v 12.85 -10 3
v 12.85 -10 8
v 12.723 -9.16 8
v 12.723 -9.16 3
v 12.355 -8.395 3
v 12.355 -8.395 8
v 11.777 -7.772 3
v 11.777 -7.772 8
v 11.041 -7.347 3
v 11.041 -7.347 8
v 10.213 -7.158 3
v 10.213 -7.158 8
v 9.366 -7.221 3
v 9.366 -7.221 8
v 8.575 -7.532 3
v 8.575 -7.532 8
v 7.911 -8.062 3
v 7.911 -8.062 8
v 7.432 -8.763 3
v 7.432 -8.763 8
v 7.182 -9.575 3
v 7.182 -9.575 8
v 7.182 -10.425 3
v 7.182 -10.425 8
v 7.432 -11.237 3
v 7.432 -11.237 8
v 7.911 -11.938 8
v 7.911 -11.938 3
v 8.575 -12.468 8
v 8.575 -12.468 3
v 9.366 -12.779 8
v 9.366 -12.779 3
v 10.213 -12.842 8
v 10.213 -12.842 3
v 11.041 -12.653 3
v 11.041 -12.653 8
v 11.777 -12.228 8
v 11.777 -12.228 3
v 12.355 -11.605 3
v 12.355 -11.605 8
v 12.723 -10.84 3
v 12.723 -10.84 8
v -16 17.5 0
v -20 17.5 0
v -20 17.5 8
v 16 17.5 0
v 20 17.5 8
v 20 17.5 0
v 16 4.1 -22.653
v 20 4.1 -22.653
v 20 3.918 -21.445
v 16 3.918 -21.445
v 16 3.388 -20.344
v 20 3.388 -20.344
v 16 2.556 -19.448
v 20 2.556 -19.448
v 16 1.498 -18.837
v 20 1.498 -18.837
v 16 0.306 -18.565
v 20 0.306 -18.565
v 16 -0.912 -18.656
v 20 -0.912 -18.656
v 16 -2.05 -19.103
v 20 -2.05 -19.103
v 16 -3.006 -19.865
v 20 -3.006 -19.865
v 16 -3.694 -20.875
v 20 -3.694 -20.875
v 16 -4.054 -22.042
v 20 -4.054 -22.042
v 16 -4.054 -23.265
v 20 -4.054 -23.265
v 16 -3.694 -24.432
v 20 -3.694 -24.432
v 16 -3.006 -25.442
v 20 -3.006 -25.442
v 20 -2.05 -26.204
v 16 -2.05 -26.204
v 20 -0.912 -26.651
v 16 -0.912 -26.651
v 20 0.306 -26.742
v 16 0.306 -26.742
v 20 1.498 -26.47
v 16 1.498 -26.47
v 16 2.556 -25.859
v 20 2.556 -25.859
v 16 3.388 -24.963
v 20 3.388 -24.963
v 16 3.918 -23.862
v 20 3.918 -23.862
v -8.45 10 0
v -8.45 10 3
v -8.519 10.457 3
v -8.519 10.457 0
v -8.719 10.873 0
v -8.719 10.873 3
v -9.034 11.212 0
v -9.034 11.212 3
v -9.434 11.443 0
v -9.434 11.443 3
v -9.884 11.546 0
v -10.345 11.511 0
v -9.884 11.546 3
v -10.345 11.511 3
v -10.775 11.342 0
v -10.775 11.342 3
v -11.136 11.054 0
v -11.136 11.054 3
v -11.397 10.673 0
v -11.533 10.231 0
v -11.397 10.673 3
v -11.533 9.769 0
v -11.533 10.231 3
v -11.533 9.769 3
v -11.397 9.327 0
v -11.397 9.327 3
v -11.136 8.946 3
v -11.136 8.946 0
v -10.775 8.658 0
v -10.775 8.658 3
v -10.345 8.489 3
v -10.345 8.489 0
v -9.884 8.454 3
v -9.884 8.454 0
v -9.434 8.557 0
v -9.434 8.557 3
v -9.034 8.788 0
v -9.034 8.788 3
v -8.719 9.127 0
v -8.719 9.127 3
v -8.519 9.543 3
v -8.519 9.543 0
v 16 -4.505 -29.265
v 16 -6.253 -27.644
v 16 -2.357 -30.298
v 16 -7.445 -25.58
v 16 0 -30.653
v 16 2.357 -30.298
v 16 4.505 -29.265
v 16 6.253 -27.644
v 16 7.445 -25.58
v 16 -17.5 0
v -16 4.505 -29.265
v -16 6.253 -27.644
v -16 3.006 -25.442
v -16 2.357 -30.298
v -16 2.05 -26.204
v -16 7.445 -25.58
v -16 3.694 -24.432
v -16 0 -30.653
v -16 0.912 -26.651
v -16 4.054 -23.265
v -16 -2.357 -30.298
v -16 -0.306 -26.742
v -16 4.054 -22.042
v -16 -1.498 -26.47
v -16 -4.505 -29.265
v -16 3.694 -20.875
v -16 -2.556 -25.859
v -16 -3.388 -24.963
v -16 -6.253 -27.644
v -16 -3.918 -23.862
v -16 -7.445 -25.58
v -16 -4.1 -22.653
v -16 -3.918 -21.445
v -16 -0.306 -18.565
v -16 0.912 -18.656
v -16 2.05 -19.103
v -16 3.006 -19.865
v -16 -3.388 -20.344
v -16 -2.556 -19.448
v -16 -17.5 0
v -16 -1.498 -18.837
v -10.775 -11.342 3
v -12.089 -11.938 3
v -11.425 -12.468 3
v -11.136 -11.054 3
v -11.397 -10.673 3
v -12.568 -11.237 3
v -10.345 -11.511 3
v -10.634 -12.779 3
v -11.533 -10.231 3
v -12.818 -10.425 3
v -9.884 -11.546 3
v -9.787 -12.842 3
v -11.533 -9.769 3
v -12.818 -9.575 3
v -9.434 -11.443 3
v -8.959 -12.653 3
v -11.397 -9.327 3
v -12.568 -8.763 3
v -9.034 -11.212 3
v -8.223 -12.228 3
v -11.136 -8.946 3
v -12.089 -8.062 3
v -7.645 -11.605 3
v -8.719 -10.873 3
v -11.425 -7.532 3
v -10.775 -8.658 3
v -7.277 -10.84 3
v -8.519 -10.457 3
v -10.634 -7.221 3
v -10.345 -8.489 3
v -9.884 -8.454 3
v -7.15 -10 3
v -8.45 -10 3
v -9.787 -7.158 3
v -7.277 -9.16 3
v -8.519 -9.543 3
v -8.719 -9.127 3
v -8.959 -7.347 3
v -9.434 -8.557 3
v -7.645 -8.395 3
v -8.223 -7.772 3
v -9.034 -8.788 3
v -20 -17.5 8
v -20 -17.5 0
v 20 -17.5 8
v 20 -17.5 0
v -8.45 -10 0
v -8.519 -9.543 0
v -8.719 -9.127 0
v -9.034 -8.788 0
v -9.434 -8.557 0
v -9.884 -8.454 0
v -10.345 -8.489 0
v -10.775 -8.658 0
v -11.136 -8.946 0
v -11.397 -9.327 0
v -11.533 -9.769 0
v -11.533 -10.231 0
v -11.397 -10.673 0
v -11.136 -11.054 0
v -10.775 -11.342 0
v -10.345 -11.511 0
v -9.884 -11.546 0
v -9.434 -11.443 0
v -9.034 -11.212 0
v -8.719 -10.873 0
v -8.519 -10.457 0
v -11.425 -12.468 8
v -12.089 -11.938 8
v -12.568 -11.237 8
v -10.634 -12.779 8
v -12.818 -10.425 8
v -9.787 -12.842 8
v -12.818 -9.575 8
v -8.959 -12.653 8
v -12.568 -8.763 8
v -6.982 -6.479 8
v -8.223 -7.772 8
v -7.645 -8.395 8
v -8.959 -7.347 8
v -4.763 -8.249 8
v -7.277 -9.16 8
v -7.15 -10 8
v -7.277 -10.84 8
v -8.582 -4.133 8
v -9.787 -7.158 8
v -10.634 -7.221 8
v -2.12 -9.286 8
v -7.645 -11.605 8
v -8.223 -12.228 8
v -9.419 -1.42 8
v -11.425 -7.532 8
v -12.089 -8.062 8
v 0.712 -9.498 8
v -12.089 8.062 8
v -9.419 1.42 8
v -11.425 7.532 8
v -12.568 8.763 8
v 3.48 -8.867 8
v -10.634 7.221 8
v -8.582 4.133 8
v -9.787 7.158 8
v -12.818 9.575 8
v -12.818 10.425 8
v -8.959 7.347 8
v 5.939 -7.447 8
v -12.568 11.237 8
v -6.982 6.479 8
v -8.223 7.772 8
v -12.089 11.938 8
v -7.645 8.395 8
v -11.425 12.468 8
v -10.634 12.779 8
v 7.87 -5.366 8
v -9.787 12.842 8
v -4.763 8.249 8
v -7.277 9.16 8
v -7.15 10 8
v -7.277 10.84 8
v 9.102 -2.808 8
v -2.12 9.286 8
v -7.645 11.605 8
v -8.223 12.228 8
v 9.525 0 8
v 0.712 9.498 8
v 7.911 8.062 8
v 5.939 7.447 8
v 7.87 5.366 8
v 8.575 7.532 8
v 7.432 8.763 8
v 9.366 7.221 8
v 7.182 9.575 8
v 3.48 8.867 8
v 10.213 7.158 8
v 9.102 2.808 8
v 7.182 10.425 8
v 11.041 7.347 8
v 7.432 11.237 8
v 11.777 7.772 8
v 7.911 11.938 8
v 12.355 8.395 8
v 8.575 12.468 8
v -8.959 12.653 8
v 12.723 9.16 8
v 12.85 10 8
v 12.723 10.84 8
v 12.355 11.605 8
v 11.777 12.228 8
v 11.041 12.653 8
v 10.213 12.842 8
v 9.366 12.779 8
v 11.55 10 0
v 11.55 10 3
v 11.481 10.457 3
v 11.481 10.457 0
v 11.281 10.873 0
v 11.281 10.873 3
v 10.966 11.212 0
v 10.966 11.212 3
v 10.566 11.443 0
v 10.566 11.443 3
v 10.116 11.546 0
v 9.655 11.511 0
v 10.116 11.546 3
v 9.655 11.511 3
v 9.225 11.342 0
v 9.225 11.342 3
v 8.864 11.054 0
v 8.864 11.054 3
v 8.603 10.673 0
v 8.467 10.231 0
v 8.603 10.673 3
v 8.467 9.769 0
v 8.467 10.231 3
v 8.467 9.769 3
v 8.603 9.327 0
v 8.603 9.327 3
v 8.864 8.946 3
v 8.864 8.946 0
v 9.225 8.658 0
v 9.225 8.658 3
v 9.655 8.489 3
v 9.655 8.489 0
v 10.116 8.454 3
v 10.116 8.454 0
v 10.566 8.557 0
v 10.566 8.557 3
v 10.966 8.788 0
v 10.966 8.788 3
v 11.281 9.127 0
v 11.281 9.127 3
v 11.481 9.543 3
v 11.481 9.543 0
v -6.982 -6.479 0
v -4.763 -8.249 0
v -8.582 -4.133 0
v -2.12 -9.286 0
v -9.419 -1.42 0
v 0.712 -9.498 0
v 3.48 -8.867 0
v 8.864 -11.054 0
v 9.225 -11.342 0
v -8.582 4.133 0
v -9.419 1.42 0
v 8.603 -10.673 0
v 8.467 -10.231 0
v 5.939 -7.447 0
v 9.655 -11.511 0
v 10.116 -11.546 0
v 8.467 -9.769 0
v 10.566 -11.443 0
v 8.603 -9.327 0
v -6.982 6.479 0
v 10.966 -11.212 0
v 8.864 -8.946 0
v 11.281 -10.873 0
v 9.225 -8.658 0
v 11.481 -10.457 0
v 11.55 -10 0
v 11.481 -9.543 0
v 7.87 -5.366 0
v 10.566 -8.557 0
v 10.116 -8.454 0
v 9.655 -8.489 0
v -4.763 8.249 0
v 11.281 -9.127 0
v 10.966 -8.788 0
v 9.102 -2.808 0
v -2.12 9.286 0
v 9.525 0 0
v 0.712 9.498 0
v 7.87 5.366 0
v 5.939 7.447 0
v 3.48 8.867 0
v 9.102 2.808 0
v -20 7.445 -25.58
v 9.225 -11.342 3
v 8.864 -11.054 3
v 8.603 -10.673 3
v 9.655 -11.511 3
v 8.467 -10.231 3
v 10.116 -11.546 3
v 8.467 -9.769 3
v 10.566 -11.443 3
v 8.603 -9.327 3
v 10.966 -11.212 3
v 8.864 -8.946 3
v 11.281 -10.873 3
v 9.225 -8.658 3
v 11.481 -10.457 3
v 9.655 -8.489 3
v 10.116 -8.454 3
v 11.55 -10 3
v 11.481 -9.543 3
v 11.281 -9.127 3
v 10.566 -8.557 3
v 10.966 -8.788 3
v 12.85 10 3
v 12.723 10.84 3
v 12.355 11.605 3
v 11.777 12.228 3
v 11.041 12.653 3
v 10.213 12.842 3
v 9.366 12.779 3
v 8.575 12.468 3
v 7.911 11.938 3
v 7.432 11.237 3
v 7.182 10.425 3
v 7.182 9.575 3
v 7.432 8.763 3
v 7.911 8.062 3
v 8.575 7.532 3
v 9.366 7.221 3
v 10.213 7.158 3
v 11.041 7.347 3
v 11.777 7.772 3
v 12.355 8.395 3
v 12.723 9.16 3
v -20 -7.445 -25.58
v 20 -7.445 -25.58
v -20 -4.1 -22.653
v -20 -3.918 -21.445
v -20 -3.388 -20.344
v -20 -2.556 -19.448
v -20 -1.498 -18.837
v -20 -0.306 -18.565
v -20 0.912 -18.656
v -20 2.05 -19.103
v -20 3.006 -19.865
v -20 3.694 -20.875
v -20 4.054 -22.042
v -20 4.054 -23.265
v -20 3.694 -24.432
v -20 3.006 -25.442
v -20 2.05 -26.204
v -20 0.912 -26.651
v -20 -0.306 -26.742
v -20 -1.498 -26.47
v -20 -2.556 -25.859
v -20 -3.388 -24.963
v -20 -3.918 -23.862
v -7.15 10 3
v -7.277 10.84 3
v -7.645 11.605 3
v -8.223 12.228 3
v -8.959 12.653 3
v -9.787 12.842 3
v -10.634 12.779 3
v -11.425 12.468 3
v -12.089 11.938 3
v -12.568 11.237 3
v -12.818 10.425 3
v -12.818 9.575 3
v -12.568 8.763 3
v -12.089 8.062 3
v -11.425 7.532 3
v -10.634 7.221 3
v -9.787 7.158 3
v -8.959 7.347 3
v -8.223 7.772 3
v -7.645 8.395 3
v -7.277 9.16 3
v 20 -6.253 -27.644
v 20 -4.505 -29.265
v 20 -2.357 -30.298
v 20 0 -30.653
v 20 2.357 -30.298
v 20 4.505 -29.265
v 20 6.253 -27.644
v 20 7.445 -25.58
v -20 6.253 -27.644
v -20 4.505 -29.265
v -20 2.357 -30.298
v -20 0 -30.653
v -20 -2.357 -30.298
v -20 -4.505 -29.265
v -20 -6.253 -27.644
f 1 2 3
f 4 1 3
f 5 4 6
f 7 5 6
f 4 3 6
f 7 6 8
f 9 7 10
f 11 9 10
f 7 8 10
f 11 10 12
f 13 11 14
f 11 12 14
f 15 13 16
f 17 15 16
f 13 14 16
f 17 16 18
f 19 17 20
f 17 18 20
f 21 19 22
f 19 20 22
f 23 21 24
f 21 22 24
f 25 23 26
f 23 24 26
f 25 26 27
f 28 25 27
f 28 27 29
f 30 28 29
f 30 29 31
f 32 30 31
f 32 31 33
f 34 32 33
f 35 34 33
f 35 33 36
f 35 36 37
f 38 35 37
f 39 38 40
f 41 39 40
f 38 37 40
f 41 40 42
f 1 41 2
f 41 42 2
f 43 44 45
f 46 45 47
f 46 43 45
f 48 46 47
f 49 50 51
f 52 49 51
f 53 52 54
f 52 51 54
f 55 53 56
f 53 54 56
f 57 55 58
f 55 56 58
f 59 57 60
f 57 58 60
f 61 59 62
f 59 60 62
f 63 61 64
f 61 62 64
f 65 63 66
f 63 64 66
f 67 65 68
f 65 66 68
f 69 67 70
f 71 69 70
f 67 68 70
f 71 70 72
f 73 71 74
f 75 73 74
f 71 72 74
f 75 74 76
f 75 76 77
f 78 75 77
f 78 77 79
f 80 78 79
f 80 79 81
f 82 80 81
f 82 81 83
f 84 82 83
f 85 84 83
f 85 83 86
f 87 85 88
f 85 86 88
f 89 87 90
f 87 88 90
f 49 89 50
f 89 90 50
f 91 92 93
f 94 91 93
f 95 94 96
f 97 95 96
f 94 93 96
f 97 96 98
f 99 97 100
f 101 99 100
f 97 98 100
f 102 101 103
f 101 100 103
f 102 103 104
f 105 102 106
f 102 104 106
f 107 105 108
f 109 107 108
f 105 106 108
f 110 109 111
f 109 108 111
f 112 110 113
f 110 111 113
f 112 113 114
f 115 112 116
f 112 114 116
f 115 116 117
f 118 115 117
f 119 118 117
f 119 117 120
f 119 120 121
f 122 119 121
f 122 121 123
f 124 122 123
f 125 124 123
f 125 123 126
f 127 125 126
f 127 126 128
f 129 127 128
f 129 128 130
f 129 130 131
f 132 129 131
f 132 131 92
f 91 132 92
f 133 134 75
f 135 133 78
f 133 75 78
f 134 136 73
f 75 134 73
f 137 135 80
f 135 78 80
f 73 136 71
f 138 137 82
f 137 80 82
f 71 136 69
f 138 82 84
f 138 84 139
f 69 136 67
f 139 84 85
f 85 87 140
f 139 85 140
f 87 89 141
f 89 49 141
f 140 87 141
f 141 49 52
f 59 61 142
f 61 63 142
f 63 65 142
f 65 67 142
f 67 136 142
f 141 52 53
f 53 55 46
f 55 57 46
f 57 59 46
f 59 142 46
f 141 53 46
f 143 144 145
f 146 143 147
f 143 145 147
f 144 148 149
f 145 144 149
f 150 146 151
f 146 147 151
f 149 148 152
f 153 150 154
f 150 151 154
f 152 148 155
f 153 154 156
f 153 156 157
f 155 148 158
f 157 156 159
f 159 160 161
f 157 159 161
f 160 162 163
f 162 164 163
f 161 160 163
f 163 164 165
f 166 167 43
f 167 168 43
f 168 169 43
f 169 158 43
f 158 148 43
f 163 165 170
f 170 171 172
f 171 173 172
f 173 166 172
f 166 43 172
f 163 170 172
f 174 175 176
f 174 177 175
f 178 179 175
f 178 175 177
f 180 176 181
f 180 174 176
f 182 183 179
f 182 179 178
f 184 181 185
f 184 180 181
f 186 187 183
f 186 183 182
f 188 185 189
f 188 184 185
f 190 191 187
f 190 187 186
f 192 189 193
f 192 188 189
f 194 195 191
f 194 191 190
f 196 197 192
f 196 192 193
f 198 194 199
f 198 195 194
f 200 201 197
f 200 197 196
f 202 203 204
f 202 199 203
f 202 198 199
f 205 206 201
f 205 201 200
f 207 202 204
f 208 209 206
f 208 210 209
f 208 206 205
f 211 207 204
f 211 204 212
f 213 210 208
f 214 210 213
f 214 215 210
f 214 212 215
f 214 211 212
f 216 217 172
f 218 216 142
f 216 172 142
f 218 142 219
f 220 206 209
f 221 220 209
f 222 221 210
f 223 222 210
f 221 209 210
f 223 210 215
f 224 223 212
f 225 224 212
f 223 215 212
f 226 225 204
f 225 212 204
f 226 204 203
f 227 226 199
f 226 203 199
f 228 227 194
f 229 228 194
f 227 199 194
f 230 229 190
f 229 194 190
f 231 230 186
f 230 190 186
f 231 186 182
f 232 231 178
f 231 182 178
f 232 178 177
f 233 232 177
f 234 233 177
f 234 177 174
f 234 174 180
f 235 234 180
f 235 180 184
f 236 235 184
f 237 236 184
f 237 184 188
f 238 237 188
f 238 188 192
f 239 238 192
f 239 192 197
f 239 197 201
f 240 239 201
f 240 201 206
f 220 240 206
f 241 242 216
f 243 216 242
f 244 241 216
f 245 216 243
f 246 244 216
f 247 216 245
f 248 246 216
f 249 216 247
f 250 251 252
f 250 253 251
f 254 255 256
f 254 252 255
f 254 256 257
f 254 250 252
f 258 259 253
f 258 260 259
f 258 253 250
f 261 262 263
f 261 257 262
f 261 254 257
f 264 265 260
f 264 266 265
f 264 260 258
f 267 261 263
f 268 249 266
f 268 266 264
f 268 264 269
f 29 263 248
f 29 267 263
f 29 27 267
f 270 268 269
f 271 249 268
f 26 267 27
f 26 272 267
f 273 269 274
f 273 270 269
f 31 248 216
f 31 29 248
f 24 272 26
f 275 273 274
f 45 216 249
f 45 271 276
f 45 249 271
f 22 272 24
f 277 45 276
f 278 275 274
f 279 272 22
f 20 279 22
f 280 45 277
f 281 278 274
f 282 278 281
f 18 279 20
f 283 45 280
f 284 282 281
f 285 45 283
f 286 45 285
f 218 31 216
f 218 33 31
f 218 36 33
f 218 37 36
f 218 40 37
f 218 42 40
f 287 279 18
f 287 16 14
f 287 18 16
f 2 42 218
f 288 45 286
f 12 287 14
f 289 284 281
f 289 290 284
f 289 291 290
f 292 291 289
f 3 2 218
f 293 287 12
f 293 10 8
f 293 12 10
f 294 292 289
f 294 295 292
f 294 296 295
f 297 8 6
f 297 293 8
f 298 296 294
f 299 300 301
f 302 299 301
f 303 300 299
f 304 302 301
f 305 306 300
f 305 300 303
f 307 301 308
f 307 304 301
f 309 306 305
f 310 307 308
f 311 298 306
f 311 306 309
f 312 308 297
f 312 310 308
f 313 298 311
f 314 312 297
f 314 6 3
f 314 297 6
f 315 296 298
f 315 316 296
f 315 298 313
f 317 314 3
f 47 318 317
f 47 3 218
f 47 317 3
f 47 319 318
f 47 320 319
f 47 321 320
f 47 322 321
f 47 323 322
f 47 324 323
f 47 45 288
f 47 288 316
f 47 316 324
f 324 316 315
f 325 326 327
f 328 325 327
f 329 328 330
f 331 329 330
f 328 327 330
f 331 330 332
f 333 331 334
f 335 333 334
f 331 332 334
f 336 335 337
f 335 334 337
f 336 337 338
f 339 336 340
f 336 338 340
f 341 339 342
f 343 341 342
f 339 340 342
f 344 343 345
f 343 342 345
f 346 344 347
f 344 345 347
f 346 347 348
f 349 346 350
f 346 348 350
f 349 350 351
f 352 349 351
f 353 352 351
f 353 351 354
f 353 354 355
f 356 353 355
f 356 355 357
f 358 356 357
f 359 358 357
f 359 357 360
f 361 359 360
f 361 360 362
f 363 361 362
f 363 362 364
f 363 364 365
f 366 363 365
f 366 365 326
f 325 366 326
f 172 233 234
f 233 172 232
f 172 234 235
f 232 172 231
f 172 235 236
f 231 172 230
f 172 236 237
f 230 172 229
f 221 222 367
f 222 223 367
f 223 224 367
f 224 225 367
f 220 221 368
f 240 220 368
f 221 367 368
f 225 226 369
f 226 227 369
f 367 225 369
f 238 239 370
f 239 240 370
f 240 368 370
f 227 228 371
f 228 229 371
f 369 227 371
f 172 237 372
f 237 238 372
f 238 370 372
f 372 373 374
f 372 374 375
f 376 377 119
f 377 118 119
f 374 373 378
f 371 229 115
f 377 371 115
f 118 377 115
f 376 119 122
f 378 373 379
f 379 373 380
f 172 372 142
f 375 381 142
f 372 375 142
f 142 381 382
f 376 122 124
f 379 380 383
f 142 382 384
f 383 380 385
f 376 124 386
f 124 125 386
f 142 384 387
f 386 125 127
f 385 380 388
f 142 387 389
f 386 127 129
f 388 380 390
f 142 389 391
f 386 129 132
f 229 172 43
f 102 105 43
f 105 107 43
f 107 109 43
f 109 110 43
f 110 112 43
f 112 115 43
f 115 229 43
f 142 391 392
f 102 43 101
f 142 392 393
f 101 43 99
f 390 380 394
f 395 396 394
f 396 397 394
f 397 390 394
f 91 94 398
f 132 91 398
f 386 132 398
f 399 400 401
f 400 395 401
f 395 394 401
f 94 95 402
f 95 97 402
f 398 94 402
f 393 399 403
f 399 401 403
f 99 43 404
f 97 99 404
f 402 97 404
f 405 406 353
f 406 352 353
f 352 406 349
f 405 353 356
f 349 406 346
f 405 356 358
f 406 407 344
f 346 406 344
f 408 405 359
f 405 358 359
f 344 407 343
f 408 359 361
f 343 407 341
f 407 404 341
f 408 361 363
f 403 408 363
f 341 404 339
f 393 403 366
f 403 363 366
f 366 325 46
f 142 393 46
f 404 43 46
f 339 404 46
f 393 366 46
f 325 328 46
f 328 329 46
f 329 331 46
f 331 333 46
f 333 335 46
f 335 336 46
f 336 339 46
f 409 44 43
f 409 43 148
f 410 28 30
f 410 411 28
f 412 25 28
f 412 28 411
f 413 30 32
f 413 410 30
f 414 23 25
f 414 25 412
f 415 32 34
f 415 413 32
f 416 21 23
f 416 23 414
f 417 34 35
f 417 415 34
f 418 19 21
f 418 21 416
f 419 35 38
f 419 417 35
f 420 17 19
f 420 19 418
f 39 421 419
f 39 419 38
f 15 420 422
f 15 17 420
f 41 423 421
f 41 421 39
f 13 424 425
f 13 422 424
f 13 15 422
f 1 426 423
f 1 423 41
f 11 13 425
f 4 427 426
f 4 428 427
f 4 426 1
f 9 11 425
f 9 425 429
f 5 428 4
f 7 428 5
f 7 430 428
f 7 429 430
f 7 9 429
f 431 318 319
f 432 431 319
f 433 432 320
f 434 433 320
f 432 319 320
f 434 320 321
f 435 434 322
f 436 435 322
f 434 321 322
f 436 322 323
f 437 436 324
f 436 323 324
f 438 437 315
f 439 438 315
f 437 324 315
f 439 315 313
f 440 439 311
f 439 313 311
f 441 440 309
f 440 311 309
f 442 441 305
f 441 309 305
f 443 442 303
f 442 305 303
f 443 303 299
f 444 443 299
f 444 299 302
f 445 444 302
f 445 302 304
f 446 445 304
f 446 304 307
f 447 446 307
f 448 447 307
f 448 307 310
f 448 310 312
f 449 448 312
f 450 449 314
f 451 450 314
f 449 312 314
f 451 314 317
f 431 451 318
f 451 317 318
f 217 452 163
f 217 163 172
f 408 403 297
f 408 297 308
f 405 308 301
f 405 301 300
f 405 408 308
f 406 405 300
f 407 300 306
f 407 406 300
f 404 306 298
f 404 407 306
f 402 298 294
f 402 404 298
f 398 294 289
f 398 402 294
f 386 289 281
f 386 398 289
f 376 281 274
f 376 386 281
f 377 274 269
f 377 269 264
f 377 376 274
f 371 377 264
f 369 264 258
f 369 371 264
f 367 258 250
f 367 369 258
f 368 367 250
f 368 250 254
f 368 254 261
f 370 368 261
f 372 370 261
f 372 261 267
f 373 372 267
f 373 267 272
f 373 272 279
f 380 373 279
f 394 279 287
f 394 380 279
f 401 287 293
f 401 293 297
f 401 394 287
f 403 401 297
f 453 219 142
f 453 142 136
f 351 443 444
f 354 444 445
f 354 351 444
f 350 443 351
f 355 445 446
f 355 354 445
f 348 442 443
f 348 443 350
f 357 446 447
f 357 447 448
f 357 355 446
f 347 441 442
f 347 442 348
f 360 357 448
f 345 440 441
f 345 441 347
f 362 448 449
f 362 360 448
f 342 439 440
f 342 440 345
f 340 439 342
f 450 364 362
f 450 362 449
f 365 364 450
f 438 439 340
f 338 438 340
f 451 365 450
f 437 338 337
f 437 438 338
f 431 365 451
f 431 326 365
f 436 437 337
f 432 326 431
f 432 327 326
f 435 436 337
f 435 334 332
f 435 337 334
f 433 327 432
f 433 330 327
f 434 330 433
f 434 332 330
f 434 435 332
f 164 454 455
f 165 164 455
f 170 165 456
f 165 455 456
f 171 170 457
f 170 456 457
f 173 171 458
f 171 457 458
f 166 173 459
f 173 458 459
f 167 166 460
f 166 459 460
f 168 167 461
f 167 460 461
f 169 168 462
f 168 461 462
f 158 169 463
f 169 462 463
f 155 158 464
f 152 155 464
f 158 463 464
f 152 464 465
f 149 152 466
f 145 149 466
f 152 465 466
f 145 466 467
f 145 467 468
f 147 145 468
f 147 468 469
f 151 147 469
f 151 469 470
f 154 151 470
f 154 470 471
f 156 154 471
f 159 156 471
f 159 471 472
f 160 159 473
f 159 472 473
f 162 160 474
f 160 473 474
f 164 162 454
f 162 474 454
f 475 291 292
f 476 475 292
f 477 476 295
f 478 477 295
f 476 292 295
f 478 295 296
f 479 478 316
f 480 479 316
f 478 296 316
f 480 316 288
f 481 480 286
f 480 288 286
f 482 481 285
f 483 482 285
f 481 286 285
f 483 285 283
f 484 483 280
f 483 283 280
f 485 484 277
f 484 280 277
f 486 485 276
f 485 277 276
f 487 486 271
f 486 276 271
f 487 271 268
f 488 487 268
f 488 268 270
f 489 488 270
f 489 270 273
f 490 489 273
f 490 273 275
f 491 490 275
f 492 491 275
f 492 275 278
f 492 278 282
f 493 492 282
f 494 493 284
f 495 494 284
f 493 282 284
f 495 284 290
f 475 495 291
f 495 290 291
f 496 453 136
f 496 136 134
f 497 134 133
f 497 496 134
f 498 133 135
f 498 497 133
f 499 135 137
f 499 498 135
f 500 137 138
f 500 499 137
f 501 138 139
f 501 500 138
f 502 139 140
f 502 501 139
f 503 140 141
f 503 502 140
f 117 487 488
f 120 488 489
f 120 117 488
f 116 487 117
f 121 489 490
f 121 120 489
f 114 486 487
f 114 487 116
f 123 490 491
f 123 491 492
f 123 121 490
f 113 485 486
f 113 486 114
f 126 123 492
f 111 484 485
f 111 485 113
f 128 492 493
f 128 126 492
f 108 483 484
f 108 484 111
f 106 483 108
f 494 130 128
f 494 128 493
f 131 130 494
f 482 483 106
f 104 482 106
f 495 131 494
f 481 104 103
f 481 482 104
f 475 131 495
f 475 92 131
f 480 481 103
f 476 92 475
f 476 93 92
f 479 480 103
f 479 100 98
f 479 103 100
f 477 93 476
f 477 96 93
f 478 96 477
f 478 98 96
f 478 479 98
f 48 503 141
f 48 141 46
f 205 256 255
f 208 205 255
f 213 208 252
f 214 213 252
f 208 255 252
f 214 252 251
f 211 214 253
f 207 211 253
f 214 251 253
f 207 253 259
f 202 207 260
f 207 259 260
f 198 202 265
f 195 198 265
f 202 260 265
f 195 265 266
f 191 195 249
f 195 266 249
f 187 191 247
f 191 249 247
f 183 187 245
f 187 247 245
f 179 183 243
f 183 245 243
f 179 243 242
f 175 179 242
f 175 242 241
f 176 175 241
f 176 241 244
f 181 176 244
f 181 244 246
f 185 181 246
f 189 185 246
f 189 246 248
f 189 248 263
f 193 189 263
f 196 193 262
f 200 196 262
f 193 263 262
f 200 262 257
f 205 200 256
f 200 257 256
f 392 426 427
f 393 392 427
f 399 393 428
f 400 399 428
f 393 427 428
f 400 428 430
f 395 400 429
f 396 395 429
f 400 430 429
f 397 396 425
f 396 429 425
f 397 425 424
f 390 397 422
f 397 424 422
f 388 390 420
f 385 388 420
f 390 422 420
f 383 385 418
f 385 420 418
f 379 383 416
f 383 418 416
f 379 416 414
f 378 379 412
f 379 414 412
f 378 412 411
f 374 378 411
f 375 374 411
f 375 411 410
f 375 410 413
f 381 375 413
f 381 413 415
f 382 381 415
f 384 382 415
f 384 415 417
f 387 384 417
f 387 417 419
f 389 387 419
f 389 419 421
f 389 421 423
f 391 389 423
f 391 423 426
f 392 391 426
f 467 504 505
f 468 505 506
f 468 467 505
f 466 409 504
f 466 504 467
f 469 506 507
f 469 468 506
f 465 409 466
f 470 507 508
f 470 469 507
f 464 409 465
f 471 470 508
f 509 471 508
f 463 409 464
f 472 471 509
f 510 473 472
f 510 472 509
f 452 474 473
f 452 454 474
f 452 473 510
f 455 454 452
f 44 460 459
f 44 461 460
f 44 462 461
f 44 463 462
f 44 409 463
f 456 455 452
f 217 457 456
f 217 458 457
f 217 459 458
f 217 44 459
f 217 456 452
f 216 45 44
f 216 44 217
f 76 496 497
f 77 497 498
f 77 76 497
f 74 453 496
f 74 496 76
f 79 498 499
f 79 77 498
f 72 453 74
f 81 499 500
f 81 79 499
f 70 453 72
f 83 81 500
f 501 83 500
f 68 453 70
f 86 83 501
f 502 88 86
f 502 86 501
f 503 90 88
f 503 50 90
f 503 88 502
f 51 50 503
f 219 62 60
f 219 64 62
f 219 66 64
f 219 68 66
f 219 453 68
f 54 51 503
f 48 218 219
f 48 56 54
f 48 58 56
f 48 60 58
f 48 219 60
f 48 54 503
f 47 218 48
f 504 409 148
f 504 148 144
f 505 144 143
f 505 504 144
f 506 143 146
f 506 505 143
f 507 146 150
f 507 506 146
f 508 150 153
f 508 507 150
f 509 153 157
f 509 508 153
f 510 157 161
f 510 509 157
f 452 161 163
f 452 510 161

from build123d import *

# Parameters (mm, degrees)
F0_W     = 40
F0_H     = 35
F0_R     = 9.525
F1_DEPTH = 8
F2_R     = 4.1
F3_DEPTH = 4
F4_R     = 4.1
F5_DEPTH = 4
F6_R     = 1.55
F7_DEPTH = 8
F6_R_2   = 2.85
F8_DEPTH = 5


with BuildPart() as f1:
    # F0 (on Top) → F1 (new body)
    with BuildSketch(Plane.XY):
        Rectangle(F0_W, F0_H)
        Circle(F0_R, mode=Mode.SUBTRACT)
    extrude(amount=F1_DEPTH)

    # F2 (on face) → F3 (join)
    with BuildSketch(Plane(origin=(-20, 0, 0), x_dir=(0, -1, 0), z_dir=(-1, 0, 0))):
        with BuildLine():
            Line((-17.5, 0), (-7.445494, -25.579978))
            ThreePointArc((-7.445494, -25.579978), (0, -30.65344), (7.445494, -25.579978))
            Line((7.445494, -25.579978), (17.5, 0))
            Line((17.5, 0), (-17.5, 0))
        make_face()
        with Locations((0, -22.65344)):
            Circle(F2_R, mode=Mode.SUBTRACT)
    extrude(amount=-F3_DEPTH)

    # F4 (on face) → F5 (join)
    with BuildSketch(Plane.YZ.offset(20)):
        with BuildLine():
            Line((17.5, 0), (-17.5, 0))
            Line((-17.5, 0), (-7.445494, -25.579978))
            ThreePointArc((-7.445494, -25.579978), (0, -30.65344), (7.445494, -25.579978))
            Line((7.445494, -25.579978), (17.5, 0))
        make_face()
        with Locations((0, -22.65344)):
            Circle(F4_R, mode=Mode.SUBTRACT)
    extrude(amount=-F5_DEPTH)

    # F6 (on face) → F7 (cut, through all)
    with BuildSketch(Plane.XY.offset(8)):
        with Locations((-10, 10)):
            Circle(F6_R)
        with Locations((10, 10)):
            Circle(F6_R)
        with Locations((-10, -10)):
            Circle(F6_R)
        with Locations((10, -10)):
            Circle(F6_R)
    extrude(amount=-F7_DEPTH, mode=Mode.SUBTRACT)

    # F6 (on face) → F8 (cut)
    with BuildSketch(Plane.XY.offset(8)):
        with Locations((-10, 10)):
            Circle(F6_R_2)
        with Locations((-10, 10)):
            Circle(F6_R, mode=Mode.SUBTRACT)
        with Locations((-10, -10)):
            Circle(F6_R_2)
        with Locations((-10, -10)):
            Circle(F6_R, mode=Mode.SUBTRACT)
        with Locations((10, 10)):
            Circle(F6_R_2)
        with Locations((10, 10)):
            Circle(F6_R, mode=Mode.SUBTRACT)
        with Locations((10, -10)):
            Circle(F6_R_2)
        with Locations((10, -10)):
            Circle(F6_R, mode=Mode.SUBTRACT)
    extrude(amount=-F8_DEPTH, mode=Mode.SUBTRACT)


solid = f1.part
